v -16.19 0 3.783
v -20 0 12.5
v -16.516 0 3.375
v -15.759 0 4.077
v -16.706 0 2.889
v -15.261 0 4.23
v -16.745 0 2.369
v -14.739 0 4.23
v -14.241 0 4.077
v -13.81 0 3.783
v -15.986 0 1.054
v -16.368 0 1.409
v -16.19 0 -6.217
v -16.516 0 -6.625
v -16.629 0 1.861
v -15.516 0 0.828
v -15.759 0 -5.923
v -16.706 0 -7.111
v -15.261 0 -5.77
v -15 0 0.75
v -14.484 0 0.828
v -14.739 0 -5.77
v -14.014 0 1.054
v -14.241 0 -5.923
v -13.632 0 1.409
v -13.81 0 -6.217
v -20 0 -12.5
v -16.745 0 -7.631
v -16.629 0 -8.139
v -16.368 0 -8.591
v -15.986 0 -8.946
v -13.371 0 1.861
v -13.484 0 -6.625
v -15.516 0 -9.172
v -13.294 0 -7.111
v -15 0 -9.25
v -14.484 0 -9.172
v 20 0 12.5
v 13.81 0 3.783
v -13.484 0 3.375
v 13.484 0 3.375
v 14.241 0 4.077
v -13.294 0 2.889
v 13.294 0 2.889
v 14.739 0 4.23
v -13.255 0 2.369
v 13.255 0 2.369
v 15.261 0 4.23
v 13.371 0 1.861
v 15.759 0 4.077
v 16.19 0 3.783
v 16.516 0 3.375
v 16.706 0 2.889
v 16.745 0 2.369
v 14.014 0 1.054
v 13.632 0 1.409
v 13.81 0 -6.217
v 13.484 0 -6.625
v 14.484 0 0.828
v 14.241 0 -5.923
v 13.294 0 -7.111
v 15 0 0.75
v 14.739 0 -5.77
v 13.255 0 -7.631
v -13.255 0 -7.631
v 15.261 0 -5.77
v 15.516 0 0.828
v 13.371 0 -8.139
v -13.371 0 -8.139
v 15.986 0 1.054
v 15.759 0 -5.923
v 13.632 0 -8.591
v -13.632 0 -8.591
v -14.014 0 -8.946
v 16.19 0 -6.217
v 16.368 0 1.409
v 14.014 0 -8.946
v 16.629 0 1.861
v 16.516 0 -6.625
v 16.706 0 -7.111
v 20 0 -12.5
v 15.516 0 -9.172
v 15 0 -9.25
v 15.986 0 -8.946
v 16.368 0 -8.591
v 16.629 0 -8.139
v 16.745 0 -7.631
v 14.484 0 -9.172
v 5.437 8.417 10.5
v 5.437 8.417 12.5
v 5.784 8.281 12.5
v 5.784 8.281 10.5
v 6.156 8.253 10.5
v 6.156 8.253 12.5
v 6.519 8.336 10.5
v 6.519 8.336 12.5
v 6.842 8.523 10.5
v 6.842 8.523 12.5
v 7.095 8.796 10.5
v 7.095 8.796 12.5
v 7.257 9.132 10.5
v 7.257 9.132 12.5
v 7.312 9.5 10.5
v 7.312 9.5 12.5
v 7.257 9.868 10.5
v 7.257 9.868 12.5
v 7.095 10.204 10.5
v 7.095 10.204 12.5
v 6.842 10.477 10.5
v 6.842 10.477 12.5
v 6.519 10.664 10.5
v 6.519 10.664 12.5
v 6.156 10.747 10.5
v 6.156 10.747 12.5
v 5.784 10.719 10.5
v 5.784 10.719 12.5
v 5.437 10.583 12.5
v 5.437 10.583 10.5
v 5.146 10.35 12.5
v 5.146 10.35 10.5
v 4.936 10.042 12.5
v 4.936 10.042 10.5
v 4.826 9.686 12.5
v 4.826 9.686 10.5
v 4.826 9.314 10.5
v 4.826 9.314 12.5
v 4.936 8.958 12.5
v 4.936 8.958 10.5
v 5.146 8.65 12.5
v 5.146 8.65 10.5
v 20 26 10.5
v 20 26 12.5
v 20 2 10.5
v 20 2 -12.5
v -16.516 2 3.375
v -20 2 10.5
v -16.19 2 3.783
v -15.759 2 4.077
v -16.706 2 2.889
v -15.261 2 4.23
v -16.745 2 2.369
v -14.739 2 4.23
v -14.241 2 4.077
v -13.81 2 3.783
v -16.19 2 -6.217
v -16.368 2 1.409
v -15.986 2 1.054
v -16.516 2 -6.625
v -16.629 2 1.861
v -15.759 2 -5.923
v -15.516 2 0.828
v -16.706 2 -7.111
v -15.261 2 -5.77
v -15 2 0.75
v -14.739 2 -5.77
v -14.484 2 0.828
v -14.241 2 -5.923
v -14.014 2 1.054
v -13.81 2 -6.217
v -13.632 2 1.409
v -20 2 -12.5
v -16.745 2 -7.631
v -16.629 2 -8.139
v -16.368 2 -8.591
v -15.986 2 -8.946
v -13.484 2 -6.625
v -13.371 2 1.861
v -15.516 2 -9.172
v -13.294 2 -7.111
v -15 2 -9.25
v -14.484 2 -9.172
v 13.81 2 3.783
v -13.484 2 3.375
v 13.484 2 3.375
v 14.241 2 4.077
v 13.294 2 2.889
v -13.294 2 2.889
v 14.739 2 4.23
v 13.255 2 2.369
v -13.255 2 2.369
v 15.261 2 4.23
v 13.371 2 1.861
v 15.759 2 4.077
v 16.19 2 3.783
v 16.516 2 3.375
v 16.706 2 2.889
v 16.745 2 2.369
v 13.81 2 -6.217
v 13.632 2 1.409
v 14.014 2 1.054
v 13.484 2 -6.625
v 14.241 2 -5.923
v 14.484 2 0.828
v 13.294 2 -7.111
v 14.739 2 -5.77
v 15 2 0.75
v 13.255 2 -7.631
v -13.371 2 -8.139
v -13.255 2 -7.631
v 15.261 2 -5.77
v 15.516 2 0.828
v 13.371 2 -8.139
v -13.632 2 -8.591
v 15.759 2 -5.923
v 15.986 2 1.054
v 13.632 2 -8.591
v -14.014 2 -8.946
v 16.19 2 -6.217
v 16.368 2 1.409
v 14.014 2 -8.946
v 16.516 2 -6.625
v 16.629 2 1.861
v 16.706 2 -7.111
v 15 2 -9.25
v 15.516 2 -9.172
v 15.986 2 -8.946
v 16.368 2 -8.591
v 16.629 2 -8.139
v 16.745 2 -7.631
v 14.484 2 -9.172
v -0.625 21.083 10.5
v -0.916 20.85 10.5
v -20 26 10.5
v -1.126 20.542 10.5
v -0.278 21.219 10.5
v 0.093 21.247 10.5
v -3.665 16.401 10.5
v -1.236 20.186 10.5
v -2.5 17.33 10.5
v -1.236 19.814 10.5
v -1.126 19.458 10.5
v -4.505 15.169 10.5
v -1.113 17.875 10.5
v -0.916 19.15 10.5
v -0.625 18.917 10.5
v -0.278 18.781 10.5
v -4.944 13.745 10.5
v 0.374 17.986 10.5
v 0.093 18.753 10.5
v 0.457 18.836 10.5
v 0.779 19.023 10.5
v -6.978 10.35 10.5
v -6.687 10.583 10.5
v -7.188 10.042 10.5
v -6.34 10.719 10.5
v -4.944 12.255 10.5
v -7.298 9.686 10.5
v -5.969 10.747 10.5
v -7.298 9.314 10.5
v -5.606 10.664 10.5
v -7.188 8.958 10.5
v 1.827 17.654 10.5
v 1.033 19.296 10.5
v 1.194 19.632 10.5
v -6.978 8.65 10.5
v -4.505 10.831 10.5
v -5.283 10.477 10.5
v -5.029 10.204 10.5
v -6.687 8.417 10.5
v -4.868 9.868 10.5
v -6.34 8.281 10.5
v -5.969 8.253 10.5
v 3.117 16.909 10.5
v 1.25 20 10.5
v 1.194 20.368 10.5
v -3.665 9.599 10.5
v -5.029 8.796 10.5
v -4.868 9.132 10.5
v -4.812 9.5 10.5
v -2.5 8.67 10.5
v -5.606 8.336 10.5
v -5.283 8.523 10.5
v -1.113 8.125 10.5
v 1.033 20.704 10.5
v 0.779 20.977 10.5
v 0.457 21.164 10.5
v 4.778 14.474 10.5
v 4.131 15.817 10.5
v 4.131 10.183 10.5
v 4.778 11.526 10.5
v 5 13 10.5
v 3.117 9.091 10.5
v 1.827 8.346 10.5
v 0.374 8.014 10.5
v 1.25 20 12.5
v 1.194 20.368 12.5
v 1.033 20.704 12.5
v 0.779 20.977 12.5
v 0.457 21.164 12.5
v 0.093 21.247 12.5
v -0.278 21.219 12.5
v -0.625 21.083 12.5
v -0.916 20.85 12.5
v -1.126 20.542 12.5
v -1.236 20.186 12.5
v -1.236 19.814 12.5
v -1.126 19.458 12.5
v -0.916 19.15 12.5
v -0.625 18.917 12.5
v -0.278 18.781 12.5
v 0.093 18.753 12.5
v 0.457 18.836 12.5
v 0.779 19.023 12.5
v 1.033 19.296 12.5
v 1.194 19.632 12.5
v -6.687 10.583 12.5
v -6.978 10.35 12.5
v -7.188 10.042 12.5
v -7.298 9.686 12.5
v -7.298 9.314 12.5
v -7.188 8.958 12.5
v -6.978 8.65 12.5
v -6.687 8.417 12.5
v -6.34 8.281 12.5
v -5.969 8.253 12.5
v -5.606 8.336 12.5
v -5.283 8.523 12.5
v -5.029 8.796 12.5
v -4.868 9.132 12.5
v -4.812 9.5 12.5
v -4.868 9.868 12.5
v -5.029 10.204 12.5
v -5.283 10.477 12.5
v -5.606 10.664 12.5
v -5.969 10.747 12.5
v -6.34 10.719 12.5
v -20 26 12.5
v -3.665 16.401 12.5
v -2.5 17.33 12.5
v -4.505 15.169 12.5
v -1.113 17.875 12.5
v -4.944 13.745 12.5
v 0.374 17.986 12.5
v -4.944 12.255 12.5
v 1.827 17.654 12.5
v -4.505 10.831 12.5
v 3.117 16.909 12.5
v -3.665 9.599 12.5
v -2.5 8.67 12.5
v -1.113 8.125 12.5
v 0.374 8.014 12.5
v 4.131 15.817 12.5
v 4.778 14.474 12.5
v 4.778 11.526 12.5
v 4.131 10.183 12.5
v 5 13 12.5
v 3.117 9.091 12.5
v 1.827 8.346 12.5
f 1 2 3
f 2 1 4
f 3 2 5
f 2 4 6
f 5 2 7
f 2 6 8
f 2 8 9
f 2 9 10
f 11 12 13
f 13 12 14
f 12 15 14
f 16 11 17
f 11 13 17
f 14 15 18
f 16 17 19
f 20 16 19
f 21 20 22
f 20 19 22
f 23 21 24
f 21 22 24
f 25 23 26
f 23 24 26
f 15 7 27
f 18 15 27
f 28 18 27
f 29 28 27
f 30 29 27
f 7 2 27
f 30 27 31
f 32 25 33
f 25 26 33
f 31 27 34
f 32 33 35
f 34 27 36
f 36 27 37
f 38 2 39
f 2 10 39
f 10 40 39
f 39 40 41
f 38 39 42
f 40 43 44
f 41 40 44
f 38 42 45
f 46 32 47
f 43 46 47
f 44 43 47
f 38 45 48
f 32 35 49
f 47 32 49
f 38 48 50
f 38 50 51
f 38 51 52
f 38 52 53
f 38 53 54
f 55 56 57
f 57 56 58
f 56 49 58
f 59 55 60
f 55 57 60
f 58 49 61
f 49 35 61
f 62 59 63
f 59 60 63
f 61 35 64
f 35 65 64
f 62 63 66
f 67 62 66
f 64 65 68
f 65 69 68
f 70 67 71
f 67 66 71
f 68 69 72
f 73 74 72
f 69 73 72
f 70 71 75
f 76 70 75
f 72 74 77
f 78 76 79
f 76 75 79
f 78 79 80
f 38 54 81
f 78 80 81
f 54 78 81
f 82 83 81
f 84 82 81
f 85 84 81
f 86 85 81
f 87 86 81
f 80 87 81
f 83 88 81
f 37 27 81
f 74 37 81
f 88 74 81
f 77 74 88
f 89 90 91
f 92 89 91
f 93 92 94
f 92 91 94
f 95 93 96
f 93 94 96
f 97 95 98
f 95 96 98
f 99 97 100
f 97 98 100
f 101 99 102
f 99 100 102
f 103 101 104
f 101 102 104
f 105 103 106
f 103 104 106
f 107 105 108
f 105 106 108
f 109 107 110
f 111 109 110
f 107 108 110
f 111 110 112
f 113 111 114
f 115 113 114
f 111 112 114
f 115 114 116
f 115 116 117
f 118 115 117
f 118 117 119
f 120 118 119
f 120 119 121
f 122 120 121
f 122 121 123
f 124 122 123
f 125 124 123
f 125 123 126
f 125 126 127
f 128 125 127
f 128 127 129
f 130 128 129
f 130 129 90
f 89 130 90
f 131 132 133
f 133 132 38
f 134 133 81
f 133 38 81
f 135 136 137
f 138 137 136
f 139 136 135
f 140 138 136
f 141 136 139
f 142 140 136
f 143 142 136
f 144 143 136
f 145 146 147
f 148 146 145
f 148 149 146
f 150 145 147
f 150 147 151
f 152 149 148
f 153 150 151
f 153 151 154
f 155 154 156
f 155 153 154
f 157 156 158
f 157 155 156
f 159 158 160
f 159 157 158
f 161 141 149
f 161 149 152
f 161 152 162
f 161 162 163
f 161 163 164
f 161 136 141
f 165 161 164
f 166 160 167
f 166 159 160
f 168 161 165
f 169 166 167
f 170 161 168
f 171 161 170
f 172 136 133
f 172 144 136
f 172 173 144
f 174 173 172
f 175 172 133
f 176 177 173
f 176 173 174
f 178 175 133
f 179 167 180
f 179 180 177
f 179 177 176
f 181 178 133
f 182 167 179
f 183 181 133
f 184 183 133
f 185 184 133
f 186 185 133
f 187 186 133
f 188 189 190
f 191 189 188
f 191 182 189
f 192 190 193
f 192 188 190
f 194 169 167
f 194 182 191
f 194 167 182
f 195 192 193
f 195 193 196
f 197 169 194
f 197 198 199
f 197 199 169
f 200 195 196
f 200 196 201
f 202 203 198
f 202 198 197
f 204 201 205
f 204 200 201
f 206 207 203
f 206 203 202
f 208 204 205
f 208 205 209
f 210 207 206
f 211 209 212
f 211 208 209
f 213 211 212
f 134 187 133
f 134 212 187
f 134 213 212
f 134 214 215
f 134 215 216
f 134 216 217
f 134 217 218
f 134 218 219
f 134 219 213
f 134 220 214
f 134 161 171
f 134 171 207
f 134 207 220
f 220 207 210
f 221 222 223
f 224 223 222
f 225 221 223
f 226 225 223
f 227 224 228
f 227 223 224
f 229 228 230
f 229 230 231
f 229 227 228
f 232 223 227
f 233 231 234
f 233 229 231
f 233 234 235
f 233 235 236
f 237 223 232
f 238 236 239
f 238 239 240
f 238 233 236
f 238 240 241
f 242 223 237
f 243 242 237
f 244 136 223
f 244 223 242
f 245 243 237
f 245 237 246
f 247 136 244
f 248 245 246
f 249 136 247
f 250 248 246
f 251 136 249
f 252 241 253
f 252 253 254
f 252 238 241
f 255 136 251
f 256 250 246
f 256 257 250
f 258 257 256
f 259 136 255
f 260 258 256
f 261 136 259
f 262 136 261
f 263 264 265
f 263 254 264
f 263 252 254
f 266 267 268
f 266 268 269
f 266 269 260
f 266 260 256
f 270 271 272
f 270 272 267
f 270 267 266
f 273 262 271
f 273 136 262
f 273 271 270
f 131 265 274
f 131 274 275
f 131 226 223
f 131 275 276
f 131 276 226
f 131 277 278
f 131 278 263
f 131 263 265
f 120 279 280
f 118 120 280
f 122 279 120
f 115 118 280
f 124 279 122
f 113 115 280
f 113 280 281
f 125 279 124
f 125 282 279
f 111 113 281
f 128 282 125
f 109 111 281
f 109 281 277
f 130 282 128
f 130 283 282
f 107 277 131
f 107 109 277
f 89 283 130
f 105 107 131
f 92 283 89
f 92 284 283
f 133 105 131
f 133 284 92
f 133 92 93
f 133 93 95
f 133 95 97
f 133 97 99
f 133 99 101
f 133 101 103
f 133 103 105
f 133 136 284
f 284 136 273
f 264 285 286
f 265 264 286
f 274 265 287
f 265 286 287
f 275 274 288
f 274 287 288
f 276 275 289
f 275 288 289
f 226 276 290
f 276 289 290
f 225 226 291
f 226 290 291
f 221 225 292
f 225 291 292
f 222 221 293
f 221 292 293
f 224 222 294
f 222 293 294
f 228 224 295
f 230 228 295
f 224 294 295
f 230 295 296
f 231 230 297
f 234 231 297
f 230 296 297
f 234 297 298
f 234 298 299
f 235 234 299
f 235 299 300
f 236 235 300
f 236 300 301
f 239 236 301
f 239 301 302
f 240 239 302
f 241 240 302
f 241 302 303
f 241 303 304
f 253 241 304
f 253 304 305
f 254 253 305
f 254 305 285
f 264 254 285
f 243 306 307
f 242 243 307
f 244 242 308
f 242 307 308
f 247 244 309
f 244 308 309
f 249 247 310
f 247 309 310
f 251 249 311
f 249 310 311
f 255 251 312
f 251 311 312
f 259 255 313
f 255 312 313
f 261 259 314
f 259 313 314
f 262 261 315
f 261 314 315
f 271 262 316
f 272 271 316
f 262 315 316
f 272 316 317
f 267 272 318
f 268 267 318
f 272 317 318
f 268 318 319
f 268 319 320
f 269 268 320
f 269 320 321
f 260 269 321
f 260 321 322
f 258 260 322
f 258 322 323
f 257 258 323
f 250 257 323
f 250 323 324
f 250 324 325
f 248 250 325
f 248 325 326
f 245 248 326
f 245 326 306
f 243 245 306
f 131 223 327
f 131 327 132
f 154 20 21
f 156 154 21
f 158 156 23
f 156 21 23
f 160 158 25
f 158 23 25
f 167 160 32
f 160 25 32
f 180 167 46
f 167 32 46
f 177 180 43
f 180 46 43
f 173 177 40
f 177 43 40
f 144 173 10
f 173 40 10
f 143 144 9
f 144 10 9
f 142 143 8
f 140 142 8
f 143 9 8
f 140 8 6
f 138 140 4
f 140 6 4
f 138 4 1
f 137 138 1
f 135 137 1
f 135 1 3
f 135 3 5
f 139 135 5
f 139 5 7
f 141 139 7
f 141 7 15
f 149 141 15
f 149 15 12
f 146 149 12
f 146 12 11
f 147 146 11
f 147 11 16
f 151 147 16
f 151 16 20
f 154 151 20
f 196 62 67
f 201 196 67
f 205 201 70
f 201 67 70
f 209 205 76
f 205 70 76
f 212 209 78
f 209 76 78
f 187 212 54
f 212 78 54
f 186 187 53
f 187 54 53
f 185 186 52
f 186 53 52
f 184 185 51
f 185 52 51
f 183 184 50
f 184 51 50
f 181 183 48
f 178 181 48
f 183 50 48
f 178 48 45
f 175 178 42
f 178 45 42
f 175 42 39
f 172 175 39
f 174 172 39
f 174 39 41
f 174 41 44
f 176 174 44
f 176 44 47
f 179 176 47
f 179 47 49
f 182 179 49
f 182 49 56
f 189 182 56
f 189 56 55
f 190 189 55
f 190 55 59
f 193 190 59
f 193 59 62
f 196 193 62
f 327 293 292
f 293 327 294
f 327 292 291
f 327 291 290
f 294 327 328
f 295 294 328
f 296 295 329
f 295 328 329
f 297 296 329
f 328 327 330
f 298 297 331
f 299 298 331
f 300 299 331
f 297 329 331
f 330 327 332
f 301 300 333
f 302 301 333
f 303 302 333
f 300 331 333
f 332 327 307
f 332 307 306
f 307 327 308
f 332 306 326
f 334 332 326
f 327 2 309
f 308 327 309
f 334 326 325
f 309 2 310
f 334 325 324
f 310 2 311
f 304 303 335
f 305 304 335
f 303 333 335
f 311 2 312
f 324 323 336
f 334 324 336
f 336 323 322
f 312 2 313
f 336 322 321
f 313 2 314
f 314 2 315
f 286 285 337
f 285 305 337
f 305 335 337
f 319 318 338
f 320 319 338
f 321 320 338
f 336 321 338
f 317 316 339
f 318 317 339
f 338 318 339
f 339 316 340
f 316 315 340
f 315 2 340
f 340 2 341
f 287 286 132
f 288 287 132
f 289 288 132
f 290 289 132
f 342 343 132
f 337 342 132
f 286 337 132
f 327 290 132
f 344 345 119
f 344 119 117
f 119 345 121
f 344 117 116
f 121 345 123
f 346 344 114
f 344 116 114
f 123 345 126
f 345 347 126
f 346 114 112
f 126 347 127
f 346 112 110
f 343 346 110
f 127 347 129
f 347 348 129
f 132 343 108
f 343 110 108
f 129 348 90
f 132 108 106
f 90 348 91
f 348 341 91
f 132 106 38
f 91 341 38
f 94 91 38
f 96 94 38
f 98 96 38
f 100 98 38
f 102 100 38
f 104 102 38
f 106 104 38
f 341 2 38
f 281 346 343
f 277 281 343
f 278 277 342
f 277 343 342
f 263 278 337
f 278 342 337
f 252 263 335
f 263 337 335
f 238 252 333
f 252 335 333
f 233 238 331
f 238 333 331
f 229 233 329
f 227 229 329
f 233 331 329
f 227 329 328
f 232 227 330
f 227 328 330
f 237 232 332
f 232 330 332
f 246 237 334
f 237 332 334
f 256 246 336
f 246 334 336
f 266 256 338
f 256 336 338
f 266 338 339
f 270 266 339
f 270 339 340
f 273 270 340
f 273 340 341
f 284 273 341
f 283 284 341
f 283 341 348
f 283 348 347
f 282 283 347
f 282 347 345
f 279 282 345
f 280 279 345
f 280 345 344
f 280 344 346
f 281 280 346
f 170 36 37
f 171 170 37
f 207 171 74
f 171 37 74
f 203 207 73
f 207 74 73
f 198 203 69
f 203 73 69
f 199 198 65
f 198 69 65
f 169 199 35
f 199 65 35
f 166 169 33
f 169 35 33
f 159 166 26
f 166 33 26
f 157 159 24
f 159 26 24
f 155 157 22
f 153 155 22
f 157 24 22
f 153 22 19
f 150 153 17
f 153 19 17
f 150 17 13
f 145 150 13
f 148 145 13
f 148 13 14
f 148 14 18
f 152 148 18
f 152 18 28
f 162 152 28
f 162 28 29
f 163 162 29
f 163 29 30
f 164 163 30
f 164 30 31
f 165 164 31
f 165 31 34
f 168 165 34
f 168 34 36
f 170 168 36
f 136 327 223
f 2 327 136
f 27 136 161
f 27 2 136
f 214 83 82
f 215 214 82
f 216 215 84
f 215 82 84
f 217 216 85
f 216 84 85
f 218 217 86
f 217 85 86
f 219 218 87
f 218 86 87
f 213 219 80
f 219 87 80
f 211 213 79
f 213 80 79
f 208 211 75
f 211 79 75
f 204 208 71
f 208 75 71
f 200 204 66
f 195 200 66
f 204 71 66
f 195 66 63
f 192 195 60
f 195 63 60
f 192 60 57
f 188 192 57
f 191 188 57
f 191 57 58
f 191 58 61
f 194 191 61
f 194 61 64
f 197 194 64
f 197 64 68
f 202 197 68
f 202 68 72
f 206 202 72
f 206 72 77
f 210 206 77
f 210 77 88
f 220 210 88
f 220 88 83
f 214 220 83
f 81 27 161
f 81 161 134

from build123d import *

# Parameters (mm, degrees)
SKETCH1_W           = 40
SKETCH1_H           = 25
BOSS_EXTRUDE1_DEPTH = 2
SKETCH2_W           = 40
SKETCH2_H           = 2
BOSS_EXTRUDE2_DEPTH = 24
SKETCH3_R           = 1.75
CUT_EXTRUDE1_DEPTH  = 36.103418637
LPATTERN1_COUNT     = 2
LPATTERN1_PITCH     = 10
SKETCH5_R           = 5
CUT_EXTRUDE2_DEPTH  = 42.243181255
SKETCH6_R           = 1.25
CUT_EXTRUDE3_DEPTH  = 42.243181255
CIRPATTERN1_COUNT   = 3


with BuildPart() as part:
    # Sketch1 → Boss-Extrude1 (new body)
    with BuildSketch(Plane(origin=(0, 0, 0), x_dir=(1, 0, 0), z_dir=(0, 1, 0))):
        Rectangle(SKETCH1_W, SKETCH1_H)
    extrude(amount=BOSS_EXTRUDE1_DEPTH)

    # Sketch2 → Boss-Extrude2 (add)
    with BuildSketch(Plane(origin=(0, 2, 0), x_dir=(1, 0, 0), z_dir=(0, 1, 0))):
        with Locations((0, -11.5)):
            Rectangle(SKETCH2_W, SKETCH2_H)
    extrude(amount=BOSS_EXTRUDE2_DEPTH)

    # Sketch3 → Cut-Extrude1 (cut, through all)
    with BuildSketch(Plane.XZ):
        with Locations(Location((-15, -7.5, 0), (0, 0, 270))):
            Circle(SKETCH3_R)
        with Locations(Location((15, -7.5, 0), (0, 0, 270))):
            Circle(SKETCH3_R)
    cut_extrude1 = extrude(amount=-CUT_EXTRUDE1_DEPTH, mode=Mode.SUBTRACT)

    # LPattern1: Cut-Extrude1 ×2
    with Locations(*[(0, 0, i * LPATTERN1_PITCH) for i in range(1, LPATTERN1_COUNT)]):
        add(cut_extrude1, mode=Mode.SUBTRACT)

    # Sketch5 → Cut-Extrude2 (cut, through all)
    with BuildSketch(Plane.XY.offset(12.5)):
        with Locations((0, 13)):
            Circle(SKETCH5_R)
    extrude(amount=-CUT_EXTRUDE2_DEPTH, mode=Mode.SUBTRACT)

    # Sketch6 → Cut-Extrude3 (cut, through all)
    with BuildSketch(Plane.XY.offset(12.5)):
        with Locations((0, 20)):
            Circle(SKETCH6_R)
    cut_extrude3 = extrude(amount=-CUT_EXTRUDE3_DEPTH, mode=Mode.SUBTRACT)

    # CirPattern1: Cut-Extrude3 ×3 about axis
    cirpattern1_axis = Axis((0, 13, 0), (0, 0, 1))
    for i in range(1, CIRPATTERN1_COUNT):
        add(cut_extrude3.rotate(cirpattern1_axis, i * 360 / CIRPATTERN1_COUNT), mode=Mode.SUBTRACT)


solid = part.part
